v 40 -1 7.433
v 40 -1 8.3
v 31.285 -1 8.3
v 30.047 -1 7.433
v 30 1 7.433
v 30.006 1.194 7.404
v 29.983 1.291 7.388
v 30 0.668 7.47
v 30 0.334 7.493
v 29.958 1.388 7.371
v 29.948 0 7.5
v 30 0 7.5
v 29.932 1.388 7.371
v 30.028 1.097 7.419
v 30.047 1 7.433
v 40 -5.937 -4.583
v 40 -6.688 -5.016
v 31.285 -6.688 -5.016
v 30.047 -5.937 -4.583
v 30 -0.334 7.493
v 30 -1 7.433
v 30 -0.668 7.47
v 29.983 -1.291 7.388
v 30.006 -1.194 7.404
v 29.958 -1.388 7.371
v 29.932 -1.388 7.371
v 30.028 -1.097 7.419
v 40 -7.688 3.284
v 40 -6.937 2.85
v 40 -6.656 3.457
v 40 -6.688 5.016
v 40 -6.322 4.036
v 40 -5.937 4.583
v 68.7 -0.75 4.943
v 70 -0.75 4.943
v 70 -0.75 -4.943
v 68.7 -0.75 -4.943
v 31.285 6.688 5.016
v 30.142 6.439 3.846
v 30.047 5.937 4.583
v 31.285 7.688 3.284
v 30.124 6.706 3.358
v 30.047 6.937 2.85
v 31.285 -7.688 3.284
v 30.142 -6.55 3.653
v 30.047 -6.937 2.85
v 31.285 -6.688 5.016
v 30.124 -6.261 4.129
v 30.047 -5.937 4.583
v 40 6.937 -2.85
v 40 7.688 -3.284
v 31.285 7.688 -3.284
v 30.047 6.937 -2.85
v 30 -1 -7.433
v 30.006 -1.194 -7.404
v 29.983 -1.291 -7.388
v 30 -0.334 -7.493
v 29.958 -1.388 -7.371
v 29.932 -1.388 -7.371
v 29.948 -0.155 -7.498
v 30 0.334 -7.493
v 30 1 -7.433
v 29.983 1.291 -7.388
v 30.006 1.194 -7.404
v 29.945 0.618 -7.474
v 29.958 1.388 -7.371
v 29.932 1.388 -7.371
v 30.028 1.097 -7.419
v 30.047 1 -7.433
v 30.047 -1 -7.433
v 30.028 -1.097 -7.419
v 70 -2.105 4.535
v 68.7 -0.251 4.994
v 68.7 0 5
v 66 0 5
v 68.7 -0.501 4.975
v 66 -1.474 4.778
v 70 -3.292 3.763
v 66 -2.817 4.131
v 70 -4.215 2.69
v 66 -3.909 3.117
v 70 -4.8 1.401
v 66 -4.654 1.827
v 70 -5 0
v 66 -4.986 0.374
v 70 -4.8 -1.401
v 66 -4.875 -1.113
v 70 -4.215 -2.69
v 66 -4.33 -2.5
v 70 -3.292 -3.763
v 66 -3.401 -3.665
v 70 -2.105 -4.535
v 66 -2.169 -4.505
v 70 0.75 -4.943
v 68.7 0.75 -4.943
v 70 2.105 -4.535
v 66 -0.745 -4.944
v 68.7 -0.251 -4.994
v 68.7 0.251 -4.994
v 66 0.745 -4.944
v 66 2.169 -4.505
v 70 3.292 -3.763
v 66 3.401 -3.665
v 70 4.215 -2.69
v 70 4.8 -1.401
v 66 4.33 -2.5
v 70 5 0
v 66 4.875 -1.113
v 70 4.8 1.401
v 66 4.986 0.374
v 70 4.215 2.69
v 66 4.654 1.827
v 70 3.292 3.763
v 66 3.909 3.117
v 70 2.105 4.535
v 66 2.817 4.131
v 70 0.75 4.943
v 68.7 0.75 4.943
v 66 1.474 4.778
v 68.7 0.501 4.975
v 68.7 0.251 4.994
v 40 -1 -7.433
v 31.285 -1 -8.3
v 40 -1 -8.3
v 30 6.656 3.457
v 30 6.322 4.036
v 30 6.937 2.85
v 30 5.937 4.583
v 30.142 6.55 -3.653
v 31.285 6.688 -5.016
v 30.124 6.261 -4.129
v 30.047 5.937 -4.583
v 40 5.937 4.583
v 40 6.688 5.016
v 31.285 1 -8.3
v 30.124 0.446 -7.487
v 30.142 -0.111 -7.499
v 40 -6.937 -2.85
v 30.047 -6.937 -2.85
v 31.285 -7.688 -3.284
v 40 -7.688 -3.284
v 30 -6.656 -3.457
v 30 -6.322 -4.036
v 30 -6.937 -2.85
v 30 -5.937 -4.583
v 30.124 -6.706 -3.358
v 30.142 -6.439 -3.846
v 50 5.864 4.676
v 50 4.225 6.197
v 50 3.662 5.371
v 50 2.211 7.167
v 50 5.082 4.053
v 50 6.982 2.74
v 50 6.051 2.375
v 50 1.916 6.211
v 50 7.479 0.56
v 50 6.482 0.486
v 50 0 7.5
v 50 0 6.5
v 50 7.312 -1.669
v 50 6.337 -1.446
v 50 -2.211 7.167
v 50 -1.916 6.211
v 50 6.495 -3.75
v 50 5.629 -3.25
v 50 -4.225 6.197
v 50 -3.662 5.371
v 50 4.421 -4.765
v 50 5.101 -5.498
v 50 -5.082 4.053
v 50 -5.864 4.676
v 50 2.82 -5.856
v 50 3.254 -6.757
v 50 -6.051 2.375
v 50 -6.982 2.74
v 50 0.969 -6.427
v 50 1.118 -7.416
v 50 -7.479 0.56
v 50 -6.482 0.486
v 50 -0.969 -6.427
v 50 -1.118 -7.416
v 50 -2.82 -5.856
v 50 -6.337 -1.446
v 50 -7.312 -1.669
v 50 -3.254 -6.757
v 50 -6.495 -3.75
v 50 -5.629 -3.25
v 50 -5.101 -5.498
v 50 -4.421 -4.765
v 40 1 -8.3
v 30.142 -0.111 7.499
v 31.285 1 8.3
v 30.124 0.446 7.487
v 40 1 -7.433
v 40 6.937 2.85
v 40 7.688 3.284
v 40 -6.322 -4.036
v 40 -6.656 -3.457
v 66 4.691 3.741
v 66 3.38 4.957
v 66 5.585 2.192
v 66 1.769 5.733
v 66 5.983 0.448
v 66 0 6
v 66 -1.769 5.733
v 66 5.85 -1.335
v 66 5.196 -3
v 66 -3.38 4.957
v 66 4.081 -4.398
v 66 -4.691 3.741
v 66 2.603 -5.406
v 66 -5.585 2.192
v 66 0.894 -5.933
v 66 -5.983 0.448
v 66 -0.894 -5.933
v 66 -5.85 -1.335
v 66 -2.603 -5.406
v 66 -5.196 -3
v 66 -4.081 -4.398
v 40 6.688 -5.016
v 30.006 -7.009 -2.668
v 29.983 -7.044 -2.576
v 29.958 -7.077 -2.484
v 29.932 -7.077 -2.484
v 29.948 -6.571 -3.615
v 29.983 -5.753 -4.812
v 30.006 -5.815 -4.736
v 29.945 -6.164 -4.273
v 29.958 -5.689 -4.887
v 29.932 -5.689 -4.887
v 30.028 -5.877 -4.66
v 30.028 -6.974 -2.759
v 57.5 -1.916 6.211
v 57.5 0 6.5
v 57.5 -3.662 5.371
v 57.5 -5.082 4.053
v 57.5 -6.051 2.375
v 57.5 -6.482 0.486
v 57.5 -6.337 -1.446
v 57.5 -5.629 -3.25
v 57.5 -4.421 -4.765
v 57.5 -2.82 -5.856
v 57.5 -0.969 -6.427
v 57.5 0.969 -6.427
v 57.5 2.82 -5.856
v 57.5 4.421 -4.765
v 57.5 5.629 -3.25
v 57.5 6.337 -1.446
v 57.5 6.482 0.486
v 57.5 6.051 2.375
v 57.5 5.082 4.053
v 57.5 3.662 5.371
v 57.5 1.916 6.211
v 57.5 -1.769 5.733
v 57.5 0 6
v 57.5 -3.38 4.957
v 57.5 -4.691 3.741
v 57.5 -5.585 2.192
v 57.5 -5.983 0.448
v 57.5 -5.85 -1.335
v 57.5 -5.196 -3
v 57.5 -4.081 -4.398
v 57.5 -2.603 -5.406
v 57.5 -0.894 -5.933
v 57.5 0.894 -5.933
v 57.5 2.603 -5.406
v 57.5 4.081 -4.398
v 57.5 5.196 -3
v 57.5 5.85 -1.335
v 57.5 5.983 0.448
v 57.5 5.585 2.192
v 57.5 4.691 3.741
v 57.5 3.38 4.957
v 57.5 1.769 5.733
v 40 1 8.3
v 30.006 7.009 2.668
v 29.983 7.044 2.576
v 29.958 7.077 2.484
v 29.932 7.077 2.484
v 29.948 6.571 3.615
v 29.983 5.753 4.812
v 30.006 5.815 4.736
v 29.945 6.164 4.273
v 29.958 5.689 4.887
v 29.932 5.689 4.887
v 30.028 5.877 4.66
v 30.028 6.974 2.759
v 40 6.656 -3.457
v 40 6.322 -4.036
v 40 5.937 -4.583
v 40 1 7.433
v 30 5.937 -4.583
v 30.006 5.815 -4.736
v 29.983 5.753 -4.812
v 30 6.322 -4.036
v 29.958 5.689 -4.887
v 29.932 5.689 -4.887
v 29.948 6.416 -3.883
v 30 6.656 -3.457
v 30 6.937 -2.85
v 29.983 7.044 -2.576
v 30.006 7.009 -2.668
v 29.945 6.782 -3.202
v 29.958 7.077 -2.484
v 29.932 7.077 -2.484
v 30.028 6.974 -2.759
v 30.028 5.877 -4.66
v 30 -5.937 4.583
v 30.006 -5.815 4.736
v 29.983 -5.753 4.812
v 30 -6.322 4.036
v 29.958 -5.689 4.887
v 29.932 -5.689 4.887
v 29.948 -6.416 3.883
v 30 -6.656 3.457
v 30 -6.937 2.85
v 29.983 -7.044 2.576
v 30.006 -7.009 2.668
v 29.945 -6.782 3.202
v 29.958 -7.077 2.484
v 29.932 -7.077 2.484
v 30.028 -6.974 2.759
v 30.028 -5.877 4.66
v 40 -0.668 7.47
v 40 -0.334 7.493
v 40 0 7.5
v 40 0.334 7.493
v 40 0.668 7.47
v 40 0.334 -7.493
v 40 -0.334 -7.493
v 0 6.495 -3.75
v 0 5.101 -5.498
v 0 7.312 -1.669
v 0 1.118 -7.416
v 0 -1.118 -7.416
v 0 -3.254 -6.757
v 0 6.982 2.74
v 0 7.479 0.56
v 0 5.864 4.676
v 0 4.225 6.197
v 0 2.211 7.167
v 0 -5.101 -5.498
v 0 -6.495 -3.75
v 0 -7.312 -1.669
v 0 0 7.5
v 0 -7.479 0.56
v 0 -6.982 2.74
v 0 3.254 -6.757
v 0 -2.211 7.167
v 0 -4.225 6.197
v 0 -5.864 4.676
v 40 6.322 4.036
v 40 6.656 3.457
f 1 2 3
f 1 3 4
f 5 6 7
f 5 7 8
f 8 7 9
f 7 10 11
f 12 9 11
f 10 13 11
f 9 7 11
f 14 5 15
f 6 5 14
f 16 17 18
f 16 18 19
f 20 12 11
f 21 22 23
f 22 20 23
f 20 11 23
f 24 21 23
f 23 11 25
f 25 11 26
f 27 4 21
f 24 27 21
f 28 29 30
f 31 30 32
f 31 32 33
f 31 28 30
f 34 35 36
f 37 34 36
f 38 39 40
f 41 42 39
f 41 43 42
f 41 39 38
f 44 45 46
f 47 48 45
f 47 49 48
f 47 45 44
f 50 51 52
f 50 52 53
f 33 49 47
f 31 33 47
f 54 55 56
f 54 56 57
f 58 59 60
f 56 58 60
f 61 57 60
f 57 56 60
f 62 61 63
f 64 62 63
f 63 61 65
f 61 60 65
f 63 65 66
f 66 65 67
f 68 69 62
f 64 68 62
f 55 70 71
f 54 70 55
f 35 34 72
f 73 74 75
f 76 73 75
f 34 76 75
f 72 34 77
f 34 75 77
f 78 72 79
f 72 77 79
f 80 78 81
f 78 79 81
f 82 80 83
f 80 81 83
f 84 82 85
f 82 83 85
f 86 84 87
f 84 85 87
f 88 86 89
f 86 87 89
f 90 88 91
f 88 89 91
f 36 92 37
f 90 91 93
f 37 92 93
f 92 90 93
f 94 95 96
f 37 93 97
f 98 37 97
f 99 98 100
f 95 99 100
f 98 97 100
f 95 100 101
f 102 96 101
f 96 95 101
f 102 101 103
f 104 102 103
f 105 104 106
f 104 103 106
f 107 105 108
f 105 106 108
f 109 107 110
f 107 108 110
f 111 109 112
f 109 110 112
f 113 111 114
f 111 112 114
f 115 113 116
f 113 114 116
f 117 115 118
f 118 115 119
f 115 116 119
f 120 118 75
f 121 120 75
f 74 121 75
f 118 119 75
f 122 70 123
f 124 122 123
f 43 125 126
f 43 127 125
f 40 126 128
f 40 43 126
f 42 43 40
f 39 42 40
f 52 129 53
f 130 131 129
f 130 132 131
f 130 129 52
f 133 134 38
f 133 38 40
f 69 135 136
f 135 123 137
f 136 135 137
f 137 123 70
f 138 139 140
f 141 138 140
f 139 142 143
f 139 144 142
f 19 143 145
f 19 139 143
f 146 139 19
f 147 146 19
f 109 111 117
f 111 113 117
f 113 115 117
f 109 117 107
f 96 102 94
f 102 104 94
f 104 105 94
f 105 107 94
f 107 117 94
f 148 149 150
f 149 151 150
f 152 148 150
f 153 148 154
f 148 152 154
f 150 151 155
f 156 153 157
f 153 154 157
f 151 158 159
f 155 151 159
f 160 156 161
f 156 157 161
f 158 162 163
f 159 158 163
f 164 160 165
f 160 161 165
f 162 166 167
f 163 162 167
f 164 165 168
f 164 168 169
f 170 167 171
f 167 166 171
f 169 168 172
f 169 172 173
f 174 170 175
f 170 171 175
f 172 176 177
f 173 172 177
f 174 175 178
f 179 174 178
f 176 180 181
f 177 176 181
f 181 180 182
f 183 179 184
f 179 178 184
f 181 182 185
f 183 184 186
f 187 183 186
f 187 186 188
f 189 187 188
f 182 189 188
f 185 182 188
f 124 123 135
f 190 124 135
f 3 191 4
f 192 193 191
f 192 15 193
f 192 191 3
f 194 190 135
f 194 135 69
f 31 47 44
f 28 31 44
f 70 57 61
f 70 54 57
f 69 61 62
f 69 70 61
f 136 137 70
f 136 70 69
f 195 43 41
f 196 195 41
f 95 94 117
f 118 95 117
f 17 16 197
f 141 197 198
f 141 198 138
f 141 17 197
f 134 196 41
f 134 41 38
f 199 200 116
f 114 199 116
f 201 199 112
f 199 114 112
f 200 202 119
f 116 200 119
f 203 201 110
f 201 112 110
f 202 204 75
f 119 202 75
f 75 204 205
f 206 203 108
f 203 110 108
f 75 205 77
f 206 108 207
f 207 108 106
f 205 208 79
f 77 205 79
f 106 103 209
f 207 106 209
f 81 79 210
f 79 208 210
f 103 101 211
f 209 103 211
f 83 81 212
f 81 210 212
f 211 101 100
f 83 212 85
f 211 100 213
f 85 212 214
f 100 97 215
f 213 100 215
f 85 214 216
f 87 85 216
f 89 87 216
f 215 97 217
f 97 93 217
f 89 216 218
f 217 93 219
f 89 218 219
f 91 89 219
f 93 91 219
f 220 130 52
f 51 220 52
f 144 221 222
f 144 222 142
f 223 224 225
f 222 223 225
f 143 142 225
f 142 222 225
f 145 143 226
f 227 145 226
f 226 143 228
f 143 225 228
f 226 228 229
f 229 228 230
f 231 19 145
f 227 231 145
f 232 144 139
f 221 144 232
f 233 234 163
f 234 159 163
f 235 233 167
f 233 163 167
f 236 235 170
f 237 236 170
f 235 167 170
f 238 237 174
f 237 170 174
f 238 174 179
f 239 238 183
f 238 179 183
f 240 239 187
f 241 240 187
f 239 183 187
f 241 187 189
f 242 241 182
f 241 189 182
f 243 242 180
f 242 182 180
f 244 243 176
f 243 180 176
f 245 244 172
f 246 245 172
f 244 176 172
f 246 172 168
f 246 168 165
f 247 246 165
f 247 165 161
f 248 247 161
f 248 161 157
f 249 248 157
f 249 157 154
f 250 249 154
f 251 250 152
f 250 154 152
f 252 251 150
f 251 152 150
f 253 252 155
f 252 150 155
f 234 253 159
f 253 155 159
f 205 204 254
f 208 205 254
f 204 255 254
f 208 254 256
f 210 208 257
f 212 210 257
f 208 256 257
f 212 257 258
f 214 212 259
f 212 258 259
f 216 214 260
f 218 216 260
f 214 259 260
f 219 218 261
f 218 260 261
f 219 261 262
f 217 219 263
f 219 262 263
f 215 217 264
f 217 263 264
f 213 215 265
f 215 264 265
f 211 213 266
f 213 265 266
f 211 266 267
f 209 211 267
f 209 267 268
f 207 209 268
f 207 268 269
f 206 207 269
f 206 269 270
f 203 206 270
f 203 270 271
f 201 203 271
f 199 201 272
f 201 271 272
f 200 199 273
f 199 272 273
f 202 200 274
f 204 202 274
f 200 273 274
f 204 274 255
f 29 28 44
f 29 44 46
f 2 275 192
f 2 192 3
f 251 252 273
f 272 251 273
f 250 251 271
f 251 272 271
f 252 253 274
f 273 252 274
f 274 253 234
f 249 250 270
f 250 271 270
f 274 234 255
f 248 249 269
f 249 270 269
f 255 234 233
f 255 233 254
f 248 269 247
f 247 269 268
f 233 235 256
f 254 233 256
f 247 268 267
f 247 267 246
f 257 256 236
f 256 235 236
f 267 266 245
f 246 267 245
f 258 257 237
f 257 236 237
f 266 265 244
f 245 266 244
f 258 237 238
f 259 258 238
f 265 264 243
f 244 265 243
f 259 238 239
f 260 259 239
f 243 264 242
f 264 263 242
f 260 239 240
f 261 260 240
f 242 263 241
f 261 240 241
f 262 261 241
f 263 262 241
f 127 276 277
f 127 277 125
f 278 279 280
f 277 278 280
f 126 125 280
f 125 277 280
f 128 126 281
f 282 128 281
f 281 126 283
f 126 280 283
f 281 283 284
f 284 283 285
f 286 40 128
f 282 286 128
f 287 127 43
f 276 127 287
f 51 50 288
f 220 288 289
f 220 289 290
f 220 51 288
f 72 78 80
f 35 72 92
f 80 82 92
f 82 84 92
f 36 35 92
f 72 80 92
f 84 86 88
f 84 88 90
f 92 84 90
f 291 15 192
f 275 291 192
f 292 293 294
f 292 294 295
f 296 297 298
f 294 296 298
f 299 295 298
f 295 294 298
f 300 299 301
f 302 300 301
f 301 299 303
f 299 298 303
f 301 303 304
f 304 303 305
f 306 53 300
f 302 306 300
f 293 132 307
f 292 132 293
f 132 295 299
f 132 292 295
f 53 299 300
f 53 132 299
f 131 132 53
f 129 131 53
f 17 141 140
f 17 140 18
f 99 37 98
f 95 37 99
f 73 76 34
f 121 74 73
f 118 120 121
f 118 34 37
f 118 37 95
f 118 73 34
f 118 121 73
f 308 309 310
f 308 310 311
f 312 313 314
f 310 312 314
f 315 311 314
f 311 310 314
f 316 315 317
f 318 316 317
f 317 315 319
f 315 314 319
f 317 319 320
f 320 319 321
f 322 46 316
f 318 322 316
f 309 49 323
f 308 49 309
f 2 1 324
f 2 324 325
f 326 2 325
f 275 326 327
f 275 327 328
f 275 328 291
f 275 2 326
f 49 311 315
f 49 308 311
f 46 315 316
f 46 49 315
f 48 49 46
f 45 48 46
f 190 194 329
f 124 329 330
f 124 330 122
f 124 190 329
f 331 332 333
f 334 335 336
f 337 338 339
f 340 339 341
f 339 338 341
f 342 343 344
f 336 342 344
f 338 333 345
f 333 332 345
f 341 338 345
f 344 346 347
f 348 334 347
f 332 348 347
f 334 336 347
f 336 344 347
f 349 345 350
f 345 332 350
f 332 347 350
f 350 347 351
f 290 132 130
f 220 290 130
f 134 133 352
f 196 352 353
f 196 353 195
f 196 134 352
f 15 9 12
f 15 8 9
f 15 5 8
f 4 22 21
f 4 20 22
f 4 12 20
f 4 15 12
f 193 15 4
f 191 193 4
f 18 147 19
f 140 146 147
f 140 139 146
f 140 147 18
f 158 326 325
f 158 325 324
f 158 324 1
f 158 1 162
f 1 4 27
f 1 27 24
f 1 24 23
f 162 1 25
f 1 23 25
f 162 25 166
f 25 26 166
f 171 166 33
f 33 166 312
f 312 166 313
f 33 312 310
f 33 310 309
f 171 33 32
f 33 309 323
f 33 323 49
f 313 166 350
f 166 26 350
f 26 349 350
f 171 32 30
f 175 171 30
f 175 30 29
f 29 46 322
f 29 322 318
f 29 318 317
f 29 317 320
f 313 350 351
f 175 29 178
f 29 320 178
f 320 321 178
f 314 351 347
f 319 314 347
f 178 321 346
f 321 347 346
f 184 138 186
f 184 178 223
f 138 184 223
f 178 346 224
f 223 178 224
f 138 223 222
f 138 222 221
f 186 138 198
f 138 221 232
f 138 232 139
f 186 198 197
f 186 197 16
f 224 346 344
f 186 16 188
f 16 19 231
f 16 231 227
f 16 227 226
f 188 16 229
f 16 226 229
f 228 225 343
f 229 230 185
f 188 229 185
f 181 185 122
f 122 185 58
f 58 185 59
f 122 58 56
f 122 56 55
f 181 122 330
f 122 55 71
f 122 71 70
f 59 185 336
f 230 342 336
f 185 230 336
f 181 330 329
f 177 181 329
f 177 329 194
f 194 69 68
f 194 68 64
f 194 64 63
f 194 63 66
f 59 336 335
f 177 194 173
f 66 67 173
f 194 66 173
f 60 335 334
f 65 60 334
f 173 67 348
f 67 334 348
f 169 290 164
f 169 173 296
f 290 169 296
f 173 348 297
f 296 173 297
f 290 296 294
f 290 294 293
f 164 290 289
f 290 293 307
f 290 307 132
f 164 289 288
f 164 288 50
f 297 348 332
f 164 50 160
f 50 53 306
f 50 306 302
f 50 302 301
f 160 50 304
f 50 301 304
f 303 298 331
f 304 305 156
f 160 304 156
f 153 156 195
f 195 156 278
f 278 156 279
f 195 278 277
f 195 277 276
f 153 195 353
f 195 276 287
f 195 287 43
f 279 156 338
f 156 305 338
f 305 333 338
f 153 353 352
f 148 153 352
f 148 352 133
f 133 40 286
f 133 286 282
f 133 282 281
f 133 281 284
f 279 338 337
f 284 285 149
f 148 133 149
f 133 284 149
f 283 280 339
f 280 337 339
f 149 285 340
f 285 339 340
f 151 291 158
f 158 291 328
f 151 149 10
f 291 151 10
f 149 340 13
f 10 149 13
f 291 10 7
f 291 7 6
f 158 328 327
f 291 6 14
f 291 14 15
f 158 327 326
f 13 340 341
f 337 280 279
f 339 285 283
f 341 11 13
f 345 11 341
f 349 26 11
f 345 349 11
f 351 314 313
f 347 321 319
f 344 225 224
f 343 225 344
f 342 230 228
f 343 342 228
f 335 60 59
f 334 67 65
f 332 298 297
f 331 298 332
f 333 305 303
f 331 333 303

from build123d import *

# Parameters (mm, degrees)
F3_DEPTH        = 1.3
F5_START        = -10
F5_DEPTH        = 10
F5_COPIES_COUNT = 6
F6_T4_DEPTH     = 8.638880276
F6_S5_R         = 7.5
F6_T6_DEPTH     = 6
F6_T10_DEPTH    = 8.638880276
F6_S11_R        = 7.5
F6_T12_DEPTH    = 6
F6_T16_DEPTH    = 8.638880276
F6_S17_R        = 7.5
F6_T18_DEPTH    = 6
F6_T22_DEPTH    = 8.638880276
F6_S23_R        = 7.5
F6_T24_DEPTH    = 6
F6_T28_DEPTH    = 8.638880276
F6_S29_R        = 7.5
F6_T30_DEPTH    = 6
F6_T34_DEPTH    = 8.638880276
F6_S35_R        = 7.5
F6_T36_DEPTH    = 6


# Not quite as in the source:
# - a fillet or chamfer that OpenCascade refuses, or shapes differently, is made with other operations: its cross-section is extruded or revolved along the edge and cut away or added
# - a pattern or mirror of a feature is missing from the dataset's text; its kind, count and spacing are read off the source's solid
# - a feature names something its author has since deleted; it is built from what else it names


with BuildPart() as f1:
    # F0 (on Front) → F1 (revolve)
    with BuildSketch(Plane.XZ):
        Polygon((70, 5), (66, 5), (66, 6), (57.5, 6), (57.5, 6.5), (50, 6.5), (50, 7.5), (0, 7.5), (0, 0), (70, 0), align=None)
    revolve(axis=Axis((22.5240401924, 0, 0), (1, 0, 0)))

    # F2 (on face) → F3 (cut)
    with BuildSketch(Plane.YZ.offset(70)):
        with BuildLine():
            ThreePointArc((0.75, 4.9434299833), (0, 5), (-0.75, 4.9434299833))
            Line((-0.75, 4.9434299833), (-0.75, -4.9434299833))
            ThreePointArc((-0.75, -4.9434299833), (0, -5), (0.75, -4.9434299833))
            Line((0.75, -4.9434299833), (0.75, 4.9434299833))
        make_face()
    extrude(amount=-F3_DEPTH, mode=Mode.SUBTRACT)

    # F4 (on face) → F5 (join)
    with BuildSketch(Plane.YZ.offset(50).offset(F5_START)):
        with BuildLine():
            ThreePointArc((-1, 7.4330343737), (0, 7.5), (1, 7.4330343737))
            Line((1, 7.4330343737), (1, 8.3))
            Line((1, 8.3), (-1, 8.3))
            Line((-1, 8.3), (-1, 7.4330343737))
        make_face()
    f5 = extrude(amount=-F5_DEPTH)

    # F5_copies: F5 ×6 about axis
    f5_copies_axis = Axis((0, 0, 0), (1, 0, 0))
    for i in range(1, F5_COPIES_COUNT):
        add(f5.rotate(f5_copies_axis, i * 360 / F5_COPIES_COUNT))

    # F6: chamfer of 0.9 x 1.2853332061 on 6 edges, made by hand


with BuildPart() as f6_tool2:
    # F6_s3 → F6_t4 (new body)
    with BuildSketch(Plane.XZ.offset(-4.319440138)):
        with BuildLine():
            Line((29.9578846671, 7.3705105264), (31.327448539, 8.3294894736))
            Line((31.327448539, 8.3294894736), (31.327448539, 8.3551961377))
            ThreePointArc((31.327448539, 8.3551961377), (30.6637242695, 8.3257066641), (30, 8.3257066641))
            Line((30, 8.3257066641), (29.9742933359, 8.3))
            ThreePointArc((29.9742933359, 8.3), (29.9742933359, 7.8352552632), (29.9321780029, 7.3705105264))
            Line((29.9321780029, 7.3705105264), (29.9578846671, 7.3705105264))
        make_face()
    extrude(amount=F6_T4_DEPTH)

    # F6_s5 → F6_t6 (cut, symmetric)
    with BuildSketch(Plane.YZ.offset(30.6)):
        Circle(F6_S5_R)
    extrude(amount=F6_T6_DEPTH, both=True, mode=Mode.SUBTRACT)


with BuildPart() as f1_1:
    add(f1.part)

    # F6_t1: cut F6_tool2
    add(f6_tool2.part, mode=Mode.SUBTRACT)


with BuildPart() as f6_tool8:
    # F6_s9 → F6_t10 (new body)
    with BuildSketch(Plane.XZ.offset(4.319440138)):
        with BuildLine():
            Line((31.327448539, -8.3294894736), (29.9578846671, -7.3705105264))
            Line((29.9578846671, -7.3705105264), (29.9321780029, -7.3705105264))
            ThreePointArc((29.9321780029, -7.3705105264), (29.9742933359, -7.8352552632), (29.9742933359, -8.3))
            Line((29.9742933359, -8.3), (30, -8.3257066641))
            ThreePointArc((30, -8.3257066641), (30.6637242695, -8.3257066641), (31.327448539, -8.3551961377))
            Line((31.327448539, -8.3551961377), (31.327448539, -8.3294894736))
        make_face()
    extrude(amount=-F6_T10_DEPTH)

    # F6_s11 → F6_t12 (cut, symmetric)
    with BuildSketch(Plane.YZ.offset(30.6)):
        Circle(F6_S11_R)
    extrude(amount=F6_T12_DEPTH, both=True, mode=Mode.SUBTRACT)


with BuildPart() as f1_2:
    add(f1_1.part)

    # F6_t7: cut F6_tool8
    add(f6_tool8.part, mode=Mode.SUBTRACT)


with BuildPart() as f6_tool14:
    # F6_s15 → F6_t16 (new body)
    with BuildSketch(Plane(origin=(0, -2.159720069, 3.7407448896), x_dir=(1, 0, 0), z_dir=(0, 0.5, -0.8660254038))):
        with BuildLine():
            Line((29.9578846671, 7.3705105264), (31.327448539, 8.3294894736))
            Line((31.327448539, 8.3294894736), (31.327448539, 8.3551961377))
            ThreePointArc((31.327448539, 8.3551961377), (30.6637242695, 8.3257066641), (30, 8.3257066641))
            Line((30, 8.3257066641), (29.9742933359, 8.3))
            ThreePointArc((29.9742933359, 8.3), (29.9742933359, 7.8352552632), (29.9321780029, 7.3705105264))
            Line((29.9321780029, 7.3705105264), (29.9578846671, 7.3705105264))
        make_face()
    extrude(amount=F6_T16_DEPTH)

    # F6_s17 → F6_t18 (cut, symmetric)
    with BuildSketch(Plane.YZ.offset(30.6)):
        Circle(F6_S17_R)
    extrude(amount=F6_T18_DEPTH, both=True, mode=Mode.SUBTRACT)


with BuildPart() as f1_3:
    add(f1_2.part)

    # F6_t13: cut F6_tool14
    add(f6_tool14.part, mode=Mode.SUBTRACT)


with BuildPart() as f6_tool20:
    # F6_s21 → F6_t22 (new body)
    with BuildSketch(Plane(origin=(0, 2.159720069, 3.7407448896), x_dir=(1, 0, 0), z_dir=(0, -0.5, -0.8660254038))):
        with BuildLine():
            Line((29.9578846671, 7.3705105264), (31.327448539, 8.3294894736))
            Line((31.327448539, 8.3294894736), (31.327448539, 8.3551961377))
            ThreePointArc((31.327448539, 8.3551961377), (30.6637242695, 8.3257066641), (30, 8.3257066641))
            Line((30, 8.3257066641), (29.9742933359, 8.3))
            ThreePointArc((29.9742933359, 8.3), (29.9742933359, 7.8352552632), (29.9321780029, 7.3705105264))
            Line((29.9321780029, 7.3705105264), (29.9578846671, 7.3705105264))
        make_face()
    extrude(amount=F6_T22_DEPTH)

    # F6_s23 → F6_t24 (cut, symmetric)
    with BuildSketch(Plane.YZ.offset(30.6)):
        Circle(F6_S23_R)
    extrude(amount=F6_T24_DEPTH, both=True, mode=Mode.SUBTRACT)


with BuildPart() as f1_4:
    add(f1_3.part)

    # F6_t19: cut F6_tool20
    add(f6_tool20.part, mode=Mode.SUBTRACT)


with BuildPart() as f6_tool26:
    # F6_s27 → F6_t28 (new body)
    with BuildSketch(Plane(origin=(0, -2.159720069, -3.7407448896), x_dir=(1, 0, 0), z_dir=(0, 0.5, 0.8660254038))):
        with BuildLine():
            Line((29.9578846671, 7.3705105264), (31.327448539, 8.3294894736))
            Line((31.327448539, 8.3294894736), (31.327448539, 8.3551961377))
            ThreePointArc((31.327448539, 8.3551961377), (30.6637242695, 8.3257066641), (30, 8.3257066641))
            Line((30, 8.3257066641), (29.9742933359, 8.3))
            ThreePointArc((29.9742933359, 8.3), (29.9742933359, 7.8352552632), (29.9321780029, 7.3705105264))
            Line((29.9321780029, 7.3705105264), (29.9578846671, 7.3705105264))
        make_face()
    extrude(amount=F6_T28_DEPTH)

    # F6_s29 → F6_t30 (cut, symmetric)
    with BuildSketch(Plane.YZ.offset(30.6)):
        Circle(F6_S29_R)
    extrude(amount=F6_T30_DEPTH, both=True, mode=Mode.SUBTRACT)


with BuildPart() as f1_5:
    add(f1_4.part)

    # F6_t25: cut F6_tool26
    add(f6_tool26.part, mode=Mode.SUBTRACT)


with BuildPart() as f6_tool32:
    # F6_s33 → F6_t34 (new body)
    with BuildSketch(Plane(origin=(0, 2.159720069, -3.7407448896), x_dir=(1, 0, 0), z_dir=(0, -0.5, 0.8660254038))):
        with BuildLine():
            Line((29.9578846671, 7.3705105264), (31.327448539, 8.3294894736))
            Line((31.327448539, 8.3294894736), (31.327448539, 8.3551961377))
            ThreePointArc((31.327448539, 8.3551961377), (30.6637242695, 8.3257066641), (30, 8.3257066641))
            Line((30, 8.3257066641), (29.9742933359, 8.3))
            ThreePointArc((29.9742933359, 8.3), (29.9742933359, 7.8352552632), (29.9321780029, 7.3705105264))
            Line((29.9321780029, 7.3705105264), (29.9578846671, 7.3705105264))
        make_face()
    extrude(amount=F6_T34_DEPTH)

    # F6_s35 → F6_t36 (cut, symmetric)
    with BuildSketch(Plane.YZ.offset(30.6)):
        Circle(F6_S35_R)
    extrude(amount=F6_T36_DEPTH, both=True, mode=Mode.SUBTRACT)


with BuildPart() as f1_6:
    add(f1_5.part)

    # F6_t31: cut F6_tool32
    add(f6_tool32.part, mode=Mode.SUBTRACT)


solid = f1_6.part
